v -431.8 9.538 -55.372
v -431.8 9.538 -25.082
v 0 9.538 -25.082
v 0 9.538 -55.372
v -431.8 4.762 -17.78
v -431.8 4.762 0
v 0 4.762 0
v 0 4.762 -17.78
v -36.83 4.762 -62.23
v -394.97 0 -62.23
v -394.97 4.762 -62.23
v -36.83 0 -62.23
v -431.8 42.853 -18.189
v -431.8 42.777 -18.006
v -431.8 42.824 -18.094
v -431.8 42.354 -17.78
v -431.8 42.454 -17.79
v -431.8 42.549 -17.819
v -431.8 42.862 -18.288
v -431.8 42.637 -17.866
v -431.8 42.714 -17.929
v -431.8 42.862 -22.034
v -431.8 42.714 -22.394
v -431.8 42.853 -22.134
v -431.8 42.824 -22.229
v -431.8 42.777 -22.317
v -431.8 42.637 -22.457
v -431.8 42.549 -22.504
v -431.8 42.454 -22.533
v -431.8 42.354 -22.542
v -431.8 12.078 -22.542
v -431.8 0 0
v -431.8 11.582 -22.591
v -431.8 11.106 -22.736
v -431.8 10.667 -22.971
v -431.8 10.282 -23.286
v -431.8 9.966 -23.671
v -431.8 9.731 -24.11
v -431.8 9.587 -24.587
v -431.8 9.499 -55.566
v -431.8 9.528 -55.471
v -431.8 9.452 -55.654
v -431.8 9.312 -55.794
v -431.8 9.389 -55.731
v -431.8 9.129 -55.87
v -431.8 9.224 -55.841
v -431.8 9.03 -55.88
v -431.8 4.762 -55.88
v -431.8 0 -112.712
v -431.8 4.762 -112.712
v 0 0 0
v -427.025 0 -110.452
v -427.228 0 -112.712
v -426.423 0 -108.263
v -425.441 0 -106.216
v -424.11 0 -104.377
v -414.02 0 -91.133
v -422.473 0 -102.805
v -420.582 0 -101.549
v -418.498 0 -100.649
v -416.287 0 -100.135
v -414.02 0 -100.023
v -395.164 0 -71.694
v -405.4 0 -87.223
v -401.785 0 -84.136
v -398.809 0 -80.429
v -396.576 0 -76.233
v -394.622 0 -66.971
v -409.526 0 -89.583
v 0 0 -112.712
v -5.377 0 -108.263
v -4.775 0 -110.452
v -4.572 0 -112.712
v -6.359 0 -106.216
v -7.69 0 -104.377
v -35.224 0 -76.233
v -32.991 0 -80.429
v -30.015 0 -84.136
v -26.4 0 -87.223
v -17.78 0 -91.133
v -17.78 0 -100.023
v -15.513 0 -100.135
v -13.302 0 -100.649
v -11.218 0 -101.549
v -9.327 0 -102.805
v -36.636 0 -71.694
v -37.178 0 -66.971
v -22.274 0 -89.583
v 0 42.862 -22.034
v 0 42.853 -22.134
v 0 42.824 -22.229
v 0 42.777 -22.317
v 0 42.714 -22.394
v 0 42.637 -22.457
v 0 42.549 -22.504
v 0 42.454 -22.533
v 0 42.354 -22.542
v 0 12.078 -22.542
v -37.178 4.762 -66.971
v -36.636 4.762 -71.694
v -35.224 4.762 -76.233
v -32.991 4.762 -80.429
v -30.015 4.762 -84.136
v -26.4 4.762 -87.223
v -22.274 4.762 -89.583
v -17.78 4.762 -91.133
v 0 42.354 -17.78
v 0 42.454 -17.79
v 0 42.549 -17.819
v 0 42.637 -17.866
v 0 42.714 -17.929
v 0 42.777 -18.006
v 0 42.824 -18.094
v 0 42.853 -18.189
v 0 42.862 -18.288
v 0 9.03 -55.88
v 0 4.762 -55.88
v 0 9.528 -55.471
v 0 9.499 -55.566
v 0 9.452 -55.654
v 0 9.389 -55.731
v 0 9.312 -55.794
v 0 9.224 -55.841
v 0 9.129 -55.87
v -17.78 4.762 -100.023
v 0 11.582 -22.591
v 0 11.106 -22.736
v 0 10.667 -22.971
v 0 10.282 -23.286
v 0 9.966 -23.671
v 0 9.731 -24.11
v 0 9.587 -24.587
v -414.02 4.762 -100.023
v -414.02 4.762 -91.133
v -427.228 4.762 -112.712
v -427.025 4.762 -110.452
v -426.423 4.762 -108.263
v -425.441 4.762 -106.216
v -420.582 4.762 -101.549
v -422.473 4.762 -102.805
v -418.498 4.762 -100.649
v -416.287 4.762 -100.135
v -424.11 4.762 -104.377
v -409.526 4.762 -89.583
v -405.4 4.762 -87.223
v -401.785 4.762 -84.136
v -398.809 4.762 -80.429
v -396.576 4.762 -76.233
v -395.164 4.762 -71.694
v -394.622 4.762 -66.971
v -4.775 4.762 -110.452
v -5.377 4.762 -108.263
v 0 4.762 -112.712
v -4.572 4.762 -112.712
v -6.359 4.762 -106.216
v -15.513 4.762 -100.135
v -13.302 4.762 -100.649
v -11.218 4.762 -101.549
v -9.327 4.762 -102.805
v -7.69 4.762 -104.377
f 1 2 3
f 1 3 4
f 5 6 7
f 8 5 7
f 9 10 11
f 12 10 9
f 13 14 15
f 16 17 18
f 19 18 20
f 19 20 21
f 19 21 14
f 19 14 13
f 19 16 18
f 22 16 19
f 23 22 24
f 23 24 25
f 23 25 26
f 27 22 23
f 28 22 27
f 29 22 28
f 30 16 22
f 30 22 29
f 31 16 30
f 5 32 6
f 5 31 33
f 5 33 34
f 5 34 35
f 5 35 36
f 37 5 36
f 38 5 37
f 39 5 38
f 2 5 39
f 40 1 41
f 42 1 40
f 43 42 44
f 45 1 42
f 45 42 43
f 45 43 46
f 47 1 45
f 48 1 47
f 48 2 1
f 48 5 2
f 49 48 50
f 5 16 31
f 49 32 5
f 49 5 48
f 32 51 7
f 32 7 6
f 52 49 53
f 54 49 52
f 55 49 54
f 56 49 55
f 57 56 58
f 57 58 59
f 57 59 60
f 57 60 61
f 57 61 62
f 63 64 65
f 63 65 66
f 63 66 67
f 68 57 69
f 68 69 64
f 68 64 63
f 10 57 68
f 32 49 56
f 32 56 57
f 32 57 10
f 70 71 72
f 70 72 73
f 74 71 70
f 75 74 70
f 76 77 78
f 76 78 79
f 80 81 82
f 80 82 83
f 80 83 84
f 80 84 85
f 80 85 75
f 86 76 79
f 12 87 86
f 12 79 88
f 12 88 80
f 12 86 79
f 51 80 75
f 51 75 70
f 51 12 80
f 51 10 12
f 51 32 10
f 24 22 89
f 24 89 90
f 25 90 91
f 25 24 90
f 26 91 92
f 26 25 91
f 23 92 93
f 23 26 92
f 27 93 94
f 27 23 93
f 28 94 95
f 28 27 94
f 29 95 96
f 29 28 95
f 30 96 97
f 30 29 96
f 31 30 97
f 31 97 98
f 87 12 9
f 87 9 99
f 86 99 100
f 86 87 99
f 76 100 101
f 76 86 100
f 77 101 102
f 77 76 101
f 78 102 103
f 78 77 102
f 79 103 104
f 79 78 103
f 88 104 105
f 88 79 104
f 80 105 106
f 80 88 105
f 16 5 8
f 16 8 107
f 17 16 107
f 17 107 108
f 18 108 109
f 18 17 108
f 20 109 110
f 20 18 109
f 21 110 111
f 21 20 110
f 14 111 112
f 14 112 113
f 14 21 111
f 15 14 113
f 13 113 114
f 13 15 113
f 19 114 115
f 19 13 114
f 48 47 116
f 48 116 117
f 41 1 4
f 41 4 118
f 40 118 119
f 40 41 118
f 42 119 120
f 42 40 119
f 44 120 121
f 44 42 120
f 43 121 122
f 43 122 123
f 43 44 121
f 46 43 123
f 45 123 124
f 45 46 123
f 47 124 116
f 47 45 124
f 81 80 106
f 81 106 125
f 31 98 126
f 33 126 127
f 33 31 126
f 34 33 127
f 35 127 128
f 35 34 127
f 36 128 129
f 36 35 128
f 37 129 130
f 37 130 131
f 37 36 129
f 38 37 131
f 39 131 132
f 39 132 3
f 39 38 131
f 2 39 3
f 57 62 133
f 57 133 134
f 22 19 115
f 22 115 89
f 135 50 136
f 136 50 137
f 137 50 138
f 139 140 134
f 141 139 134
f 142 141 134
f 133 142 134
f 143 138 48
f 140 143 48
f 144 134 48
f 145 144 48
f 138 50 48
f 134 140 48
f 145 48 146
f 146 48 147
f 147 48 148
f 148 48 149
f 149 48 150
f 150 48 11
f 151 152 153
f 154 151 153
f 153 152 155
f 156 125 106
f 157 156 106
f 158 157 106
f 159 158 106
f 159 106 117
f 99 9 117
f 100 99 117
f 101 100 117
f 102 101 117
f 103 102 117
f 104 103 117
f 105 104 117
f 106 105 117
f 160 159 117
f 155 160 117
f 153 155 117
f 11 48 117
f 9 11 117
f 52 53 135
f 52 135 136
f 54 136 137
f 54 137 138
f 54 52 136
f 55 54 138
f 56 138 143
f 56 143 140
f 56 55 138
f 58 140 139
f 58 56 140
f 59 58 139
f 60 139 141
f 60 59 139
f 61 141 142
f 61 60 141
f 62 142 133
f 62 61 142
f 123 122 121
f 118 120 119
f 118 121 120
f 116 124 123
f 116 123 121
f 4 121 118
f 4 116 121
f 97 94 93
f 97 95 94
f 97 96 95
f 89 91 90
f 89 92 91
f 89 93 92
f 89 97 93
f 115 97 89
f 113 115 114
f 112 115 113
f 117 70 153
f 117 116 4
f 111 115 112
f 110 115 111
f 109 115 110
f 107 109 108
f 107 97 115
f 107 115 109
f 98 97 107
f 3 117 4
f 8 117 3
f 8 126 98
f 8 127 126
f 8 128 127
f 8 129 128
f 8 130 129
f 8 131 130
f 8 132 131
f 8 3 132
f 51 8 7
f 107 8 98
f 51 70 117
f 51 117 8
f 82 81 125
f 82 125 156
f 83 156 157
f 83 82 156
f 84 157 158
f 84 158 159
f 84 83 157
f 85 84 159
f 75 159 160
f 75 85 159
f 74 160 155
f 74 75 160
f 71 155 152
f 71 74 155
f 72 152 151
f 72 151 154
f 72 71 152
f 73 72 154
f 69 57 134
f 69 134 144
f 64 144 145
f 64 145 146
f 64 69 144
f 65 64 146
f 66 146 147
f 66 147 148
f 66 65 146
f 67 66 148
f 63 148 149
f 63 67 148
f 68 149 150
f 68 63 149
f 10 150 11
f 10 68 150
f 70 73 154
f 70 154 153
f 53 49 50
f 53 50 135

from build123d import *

# Parameters (mm, degrees)
F1_DEPTH = 4.7625
F3_DEPTH = 431.8


with BuildPart() as f1:
    # F0 (on Front) → F1 (new body)
    with BuildSketch(Plane.XZ):
        with BuildLine():
            Line((0, 0), (-215.9, 0))
            Line((-215.9, 0), (-431.8, 0))
            Line((-431.8, 0), (-431.8, -112.7125))
            Line((-431.8, -112.7125), (-427.228, -112.7125))
            ThreePointArc((-427.228, -112.7125), (-423.326818, -103.5544), (-414.02, -100.022664))
            Line((-414.02, -100.022664), (-414.02, -91.132664))
            ThreePointArc((-414.02, -91.132664), (-398.8091, -80.428959), (-394.97, -62.23))
            Line((-394.97, -62.23), (-215.9, -62.23))
            Line((-215.9, -62.23), (-36.83, -62.23))
            ThreePointArc((-36.83, -62.23), (-32.9909, -80.428959), (-17.78, -91.132664))
            Line((-17.78, -91.132664), (-17.78, -100.022664))
            ThreePointArc((-17.78, -100.022664), (-8.473182, -103.5544), (-4.572, -112.7125))
            Line((-4.572, -112.7125), (0, -112.7125))
            Line((0, -112.7125), (0, 0))
        make_face()
    extrude(amount=-F1_DEPTH)

    # F2 (on face) → F3 (join, through all)
    with BuildSketch(Plane(origin=(-431.8, 0, 0), x_dir=(0, -1, 0), z_dir=(-1, 0, 0))):
        with BuildLine():
            Line((-4.7625, -55.88), (-4.7625, -17.78))
            Line((-4.7625, -17.78), (-42.3545, -17.78))
            ThreePointArc((-42.3545, -17.78), (-42.71371, -17.92879), (-42.8625, -18.288))
            Line((-42.8625, -18.288), (-42.8625, -22.0345))
            ThreePointArc((-42.8625, -22.0345), (-42.71371, -22.39371), (-42.3545, -22.5425))
            Line((-42.3545, -22.5425), (-12.0777, -22.5425))
            ThreePointArc((-12.0777, -22.5425), (-10.281649, -23.286449), (-9.5377, -25.0825))
            Line((-9.5377, -25.0825), (-9.5377, -55.372))
            ThreePointArc((-9.5377, -55.372), (-9.38891, -55.73121), (-9.0297, -55.88))
            Line((-9.0297, -55.88), (-4.7625, -55.88))
        make_face()
    extrude(amount=-F3_DEPTH)


solid = f1.part
